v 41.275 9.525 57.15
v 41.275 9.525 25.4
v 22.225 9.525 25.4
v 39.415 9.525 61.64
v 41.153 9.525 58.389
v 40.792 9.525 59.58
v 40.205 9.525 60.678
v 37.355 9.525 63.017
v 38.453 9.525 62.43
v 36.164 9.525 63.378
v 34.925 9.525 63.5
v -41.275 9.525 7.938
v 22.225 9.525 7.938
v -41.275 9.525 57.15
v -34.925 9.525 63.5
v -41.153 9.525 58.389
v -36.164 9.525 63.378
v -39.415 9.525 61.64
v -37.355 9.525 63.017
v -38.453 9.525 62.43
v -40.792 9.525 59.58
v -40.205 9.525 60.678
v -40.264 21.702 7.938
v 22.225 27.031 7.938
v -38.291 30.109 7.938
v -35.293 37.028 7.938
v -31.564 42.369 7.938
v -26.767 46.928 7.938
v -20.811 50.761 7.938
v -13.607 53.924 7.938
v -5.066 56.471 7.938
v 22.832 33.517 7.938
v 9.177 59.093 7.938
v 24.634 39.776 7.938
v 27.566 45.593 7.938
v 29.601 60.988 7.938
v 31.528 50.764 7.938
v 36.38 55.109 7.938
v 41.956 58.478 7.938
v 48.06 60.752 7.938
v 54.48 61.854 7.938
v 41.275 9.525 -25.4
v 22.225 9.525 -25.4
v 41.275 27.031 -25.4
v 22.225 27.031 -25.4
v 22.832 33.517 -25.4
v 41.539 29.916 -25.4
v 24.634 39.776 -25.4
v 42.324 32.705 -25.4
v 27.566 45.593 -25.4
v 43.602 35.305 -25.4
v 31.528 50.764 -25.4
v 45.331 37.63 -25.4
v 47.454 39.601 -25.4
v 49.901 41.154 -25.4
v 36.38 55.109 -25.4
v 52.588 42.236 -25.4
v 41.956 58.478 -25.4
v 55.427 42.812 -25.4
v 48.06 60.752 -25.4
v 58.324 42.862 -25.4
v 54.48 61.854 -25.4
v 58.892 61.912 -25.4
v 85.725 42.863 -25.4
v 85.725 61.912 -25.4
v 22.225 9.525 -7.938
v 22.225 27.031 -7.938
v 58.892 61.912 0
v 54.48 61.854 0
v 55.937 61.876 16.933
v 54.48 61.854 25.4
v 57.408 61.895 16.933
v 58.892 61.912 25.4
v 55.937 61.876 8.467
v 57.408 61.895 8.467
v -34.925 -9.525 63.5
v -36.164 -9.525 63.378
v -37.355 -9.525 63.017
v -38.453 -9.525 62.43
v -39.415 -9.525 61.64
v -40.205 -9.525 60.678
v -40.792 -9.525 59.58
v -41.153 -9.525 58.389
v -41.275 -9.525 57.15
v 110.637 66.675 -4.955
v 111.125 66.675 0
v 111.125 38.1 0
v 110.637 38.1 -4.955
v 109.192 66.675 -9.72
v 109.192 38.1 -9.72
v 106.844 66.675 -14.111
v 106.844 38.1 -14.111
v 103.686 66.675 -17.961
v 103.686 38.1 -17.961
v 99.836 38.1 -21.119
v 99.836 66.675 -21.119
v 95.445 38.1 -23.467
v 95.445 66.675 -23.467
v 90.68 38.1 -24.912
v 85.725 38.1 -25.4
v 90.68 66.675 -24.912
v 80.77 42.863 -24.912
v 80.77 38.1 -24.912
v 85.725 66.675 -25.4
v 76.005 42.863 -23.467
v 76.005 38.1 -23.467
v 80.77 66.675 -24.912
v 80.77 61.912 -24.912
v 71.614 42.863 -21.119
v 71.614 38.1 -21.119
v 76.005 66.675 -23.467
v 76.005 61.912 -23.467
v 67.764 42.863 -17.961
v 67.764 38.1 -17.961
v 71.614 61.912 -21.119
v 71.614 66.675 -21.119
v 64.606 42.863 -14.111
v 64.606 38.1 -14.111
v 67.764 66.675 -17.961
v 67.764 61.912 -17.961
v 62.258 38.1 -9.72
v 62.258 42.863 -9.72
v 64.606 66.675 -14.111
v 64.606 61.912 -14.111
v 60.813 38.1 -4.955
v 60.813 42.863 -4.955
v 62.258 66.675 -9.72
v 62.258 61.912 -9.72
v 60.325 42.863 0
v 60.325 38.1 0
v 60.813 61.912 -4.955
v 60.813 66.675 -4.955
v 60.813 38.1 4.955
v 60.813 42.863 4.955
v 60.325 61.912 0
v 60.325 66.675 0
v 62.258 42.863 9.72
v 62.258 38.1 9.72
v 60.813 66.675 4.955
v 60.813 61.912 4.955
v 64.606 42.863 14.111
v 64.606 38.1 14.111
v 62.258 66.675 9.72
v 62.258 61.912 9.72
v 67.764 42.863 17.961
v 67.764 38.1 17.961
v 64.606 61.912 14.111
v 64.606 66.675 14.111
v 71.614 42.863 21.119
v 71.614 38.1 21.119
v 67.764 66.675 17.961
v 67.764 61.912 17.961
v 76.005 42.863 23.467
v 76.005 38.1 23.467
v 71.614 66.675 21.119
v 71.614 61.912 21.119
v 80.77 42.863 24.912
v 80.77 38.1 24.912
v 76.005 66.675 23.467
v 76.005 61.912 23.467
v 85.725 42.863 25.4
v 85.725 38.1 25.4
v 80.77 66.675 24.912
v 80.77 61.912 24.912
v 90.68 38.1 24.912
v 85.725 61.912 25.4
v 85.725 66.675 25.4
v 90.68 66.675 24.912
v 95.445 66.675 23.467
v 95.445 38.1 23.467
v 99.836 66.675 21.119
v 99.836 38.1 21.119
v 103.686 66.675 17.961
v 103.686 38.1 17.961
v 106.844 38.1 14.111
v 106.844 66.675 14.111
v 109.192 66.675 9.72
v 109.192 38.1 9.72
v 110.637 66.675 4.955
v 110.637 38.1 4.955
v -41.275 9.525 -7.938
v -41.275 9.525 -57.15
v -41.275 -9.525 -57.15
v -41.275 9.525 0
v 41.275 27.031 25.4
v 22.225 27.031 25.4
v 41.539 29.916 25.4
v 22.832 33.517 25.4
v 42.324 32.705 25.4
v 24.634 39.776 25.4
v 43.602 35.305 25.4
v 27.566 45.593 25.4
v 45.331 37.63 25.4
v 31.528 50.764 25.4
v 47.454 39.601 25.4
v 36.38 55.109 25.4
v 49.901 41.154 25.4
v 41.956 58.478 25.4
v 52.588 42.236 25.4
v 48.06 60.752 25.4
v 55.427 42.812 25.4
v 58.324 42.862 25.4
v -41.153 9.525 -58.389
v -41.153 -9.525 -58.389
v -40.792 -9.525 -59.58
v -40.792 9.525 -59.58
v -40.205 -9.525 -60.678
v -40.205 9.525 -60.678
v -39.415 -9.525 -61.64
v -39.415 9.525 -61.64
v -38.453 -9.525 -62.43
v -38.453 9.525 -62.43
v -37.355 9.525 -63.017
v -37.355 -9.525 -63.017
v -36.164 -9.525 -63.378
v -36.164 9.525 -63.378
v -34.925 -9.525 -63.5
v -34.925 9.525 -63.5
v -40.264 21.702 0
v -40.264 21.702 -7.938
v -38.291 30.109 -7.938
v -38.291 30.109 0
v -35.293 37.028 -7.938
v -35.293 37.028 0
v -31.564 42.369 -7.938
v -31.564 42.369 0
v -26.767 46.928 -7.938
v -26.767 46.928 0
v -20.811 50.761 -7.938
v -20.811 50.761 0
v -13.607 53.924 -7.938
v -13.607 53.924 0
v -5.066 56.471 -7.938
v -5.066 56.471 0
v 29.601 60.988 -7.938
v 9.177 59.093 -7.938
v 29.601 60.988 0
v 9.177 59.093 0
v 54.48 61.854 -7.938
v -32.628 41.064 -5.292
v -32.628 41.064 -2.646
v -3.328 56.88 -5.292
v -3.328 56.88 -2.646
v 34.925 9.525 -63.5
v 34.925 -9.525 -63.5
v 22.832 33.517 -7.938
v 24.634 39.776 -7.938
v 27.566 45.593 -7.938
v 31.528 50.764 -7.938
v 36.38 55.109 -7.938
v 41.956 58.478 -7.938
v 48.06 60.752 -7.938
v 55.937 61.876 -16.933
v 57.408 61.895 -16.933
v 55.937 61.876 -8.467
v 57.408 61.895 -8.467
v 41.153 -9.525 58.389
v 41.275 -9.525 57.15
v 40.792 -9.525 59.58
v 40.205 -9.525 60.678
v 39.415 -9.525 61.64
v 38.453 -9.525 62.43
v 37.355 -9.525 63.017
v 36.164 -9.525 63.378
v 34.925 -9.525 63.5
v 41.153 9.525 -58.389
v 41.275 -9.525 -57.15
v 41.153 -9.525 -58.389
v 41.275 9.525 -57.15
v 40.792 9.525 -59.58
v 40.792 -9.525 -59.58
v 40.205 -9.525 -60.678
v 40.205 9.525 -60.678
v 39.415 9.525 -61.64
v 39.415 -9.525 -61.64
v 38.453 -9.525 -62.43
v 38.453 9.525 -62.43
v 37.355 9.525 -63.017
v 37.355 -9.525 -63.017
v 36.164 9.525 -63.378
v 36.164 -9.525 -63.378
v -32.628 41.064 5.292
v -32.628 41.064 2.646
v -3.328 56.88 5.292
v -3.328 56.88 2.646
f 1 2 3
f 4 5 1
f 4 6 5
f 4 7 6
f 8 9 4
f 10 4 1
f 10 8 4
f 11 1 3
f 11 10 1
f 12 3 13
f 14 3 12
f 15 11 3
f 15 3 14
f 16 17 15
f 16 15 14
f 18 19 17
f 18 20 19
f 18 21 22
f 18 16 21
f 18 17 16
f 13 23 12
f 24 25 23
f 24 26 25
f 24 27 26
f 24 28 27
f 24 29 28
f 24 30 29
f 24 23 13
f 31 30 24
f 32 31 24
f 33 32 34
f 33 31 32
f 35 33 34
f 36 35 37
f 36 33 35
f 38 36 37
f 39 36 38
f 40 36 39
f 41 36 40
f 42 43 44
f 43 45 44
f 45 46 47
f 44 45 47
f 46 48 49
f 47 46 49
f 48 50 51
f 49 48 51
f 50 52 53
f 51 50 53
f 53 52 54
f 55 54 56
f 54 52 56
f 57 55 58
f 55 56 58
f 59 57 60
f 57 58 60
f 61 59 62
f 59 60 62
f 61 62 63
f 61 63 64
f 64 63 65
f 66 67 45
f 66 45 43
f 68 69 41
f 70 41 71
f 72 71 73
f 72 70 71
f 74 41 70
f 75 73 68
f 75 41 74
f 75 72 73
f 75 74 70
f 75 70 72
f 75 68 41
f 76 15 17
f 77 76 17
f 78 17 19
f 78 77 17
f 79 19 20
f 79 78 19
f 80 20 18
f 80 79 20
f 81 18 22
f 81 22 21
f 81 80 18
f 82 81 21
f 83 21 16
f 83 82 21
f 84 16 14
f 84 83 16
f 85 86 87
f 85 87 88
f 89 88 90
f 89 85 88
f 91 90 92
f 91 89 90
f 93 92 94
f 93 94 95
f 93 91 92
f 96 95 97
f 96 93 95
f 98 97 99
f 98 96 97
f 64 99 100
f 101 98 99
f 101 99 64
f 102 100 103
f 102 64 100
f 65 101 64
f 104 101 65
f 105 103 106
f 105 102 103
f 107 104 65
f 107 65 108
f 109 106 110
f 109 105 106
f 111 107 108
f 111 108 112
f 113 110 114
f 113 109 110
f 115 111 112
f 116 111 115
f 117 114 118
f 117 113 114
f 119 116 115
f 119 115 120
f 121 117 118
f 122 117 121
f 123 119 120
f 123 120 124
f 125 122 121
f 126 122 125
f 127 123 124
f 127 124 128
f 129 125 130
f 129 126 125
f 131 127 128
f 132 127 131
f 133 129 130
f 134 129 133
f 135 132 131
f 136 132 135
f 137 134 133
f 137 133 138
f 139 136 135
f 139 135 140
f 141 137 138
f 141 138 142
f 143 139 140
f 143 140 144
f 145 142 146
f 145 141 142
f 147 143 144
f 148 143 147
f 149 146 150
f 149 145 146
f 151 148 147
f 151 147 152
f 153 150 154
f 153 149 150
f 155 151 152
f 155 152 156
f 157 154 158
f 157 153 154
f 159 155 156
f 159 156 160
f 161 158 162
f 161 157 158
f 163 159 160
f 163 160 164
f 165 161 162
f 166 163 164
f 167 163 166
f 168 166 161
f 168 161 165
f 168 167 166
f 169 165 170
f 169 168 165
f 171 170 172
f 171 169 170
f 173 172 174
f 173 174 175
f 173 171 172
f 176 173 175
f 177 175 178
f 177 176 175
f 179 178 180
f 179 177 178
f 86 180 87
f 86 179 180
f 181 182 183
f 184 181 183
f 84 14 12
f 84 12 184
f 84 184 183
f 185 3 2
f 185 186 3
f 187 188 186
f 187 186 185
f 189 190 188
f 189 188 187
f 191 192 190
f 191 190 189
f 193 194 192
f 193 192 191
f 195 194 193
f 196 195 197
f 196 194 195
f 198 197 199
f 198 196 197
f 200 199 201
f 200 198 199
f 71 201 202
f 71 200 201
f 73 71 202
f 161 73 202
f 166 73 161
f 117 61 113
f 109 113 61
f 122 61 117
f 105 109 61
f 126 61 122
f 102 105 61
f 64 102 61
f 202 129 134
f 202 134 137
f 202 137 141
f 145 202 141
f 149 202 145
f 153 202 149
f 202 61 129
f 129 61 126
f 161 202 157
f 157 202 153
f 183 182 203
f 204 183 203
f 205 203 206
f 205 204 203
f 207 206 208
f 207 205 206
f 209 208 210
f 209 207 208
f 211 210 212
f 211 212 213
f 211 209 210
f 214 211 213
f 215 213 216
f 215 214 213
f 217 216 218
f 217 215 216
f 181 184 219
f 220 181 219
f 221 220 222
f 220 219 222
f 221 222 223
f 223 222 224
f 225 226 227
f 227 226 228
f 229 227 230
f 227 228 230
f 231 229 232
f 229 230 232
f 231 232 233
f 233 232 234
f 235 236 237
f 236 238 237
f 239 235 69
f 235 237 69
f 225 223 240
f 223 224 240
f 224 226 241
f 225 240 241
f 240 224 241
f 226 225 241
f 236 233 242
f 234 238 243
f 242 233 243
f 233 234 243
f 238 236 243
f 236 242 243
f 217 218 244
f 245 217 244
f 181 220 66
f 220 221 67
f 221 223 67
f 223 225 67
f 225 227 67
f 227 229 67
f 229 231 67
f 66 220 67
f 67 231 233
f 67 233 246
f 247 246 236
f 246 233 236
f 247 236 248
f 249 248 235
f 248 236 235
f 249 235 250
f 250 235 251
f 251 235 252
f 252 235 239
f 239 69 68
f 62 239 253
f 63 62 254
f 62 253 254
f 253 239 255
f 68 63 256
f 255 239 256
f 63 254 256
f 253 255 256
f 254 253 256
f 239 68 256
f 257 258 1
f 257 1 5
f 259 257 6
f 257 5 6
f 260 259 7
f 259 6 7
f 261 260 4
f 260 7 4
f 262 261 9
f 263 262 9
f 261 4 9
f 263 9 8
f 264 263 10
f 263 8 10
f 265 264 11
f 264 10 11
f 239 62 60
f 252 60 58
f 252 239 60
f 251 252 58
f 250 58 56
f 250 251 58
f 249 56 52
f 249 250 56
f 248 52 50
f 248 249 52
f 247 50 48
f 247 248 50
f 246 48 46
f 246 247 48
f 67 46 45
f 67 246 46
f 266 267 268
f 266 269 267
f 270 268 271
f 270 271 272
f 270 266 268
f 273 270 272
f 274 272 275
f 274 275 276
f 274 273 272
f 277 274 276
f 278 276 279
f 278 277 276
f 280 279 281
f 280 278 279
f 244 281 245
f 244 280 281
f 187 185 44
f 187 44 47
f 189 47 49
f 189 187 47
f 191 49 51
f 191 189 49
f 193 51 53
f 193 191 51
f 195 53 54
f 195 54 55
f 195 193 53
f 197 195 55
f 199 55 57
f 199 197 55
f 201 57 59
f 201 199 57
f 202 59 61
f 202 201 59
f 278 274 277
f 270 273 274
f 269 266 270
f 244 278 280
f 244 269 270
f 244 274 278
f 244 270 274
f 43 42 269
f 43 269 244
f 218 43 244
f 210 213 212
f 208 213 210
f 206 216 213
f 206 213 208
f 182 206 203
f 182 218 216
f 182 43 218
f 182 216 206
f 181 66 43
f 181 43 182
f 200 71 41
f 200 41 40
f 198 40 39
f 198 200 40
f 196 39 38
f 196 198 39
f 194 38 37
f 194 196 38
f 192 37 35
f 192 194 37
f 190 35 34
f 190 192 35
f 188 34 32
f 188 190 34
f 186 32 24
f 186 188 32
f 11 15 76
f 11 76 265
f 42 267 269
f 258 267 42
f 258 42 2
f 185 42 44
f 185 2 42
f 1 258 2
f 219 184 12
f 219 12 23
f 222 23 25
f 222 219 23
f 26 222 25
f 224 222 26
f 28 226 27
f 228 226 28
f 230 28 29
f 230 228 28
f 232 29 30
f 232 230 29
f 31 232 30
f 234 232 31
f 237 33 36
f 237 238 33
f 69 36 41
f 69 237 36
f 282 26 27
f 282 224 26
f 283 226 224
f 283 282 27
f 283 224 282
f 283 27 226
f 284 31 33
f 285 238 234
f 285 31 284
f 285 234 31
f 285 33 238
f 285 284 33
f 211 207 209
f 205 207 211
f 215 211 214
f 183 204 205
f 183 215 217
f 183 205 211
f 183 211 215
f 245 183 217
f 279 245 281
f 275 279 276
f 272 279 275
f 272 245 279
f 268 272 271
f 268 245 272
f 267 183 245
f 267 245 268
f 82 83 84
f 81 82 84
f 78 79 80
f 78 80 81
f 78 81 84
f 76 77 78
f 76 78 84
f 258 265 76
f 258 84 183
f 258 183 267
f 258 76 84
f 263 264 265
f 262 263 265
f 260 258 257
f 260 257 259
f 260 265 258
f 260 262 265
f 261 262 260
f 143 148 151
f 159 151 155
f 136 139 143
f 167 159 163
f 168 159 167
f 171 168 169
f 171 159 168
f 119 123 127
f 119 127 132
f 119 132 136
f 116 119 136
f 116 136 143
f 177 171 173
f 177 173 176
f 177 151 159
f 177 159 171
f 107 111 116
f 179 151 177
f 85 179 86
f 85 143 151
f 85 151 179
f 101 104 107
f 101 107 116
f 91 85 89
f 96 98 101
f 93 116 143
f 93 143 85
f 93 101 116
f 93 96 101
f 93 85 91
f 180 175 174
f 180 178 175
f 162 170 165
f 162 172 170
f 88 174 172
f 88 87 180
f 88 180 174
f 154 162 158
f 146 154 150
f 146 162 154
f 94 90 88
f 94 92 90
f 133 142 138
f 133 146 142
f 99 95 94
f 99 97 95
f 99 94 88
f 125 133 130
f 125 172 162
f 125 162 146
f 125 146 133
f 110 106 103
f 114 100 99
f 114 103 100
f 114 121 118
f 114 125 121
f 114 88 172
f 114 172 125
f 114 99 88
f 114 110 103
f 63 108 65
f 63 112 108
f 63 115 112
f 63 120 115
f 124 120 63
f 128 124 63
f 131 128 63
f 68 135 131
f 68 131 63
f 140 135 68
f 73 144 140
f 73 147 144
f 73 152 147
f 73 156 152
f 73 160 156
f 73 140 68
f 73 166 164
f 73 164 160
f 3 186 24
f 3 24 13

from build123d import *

# Parameters (mm, degrees)
F1_DEPTH = 63.5
F0_W     = 25.4
F0_H     = 19.05
F2_DEPTH = 25.4
F3_DEPTH = 7.9375
F5_R     = 6.35


with BuildPart() as f1:
    # F0 (on Top) → F1 (new body, symmetric)
    with BuildSketch(Plane.XY):
        Polygon((41.275, -9.525), (41.275, 9.525), (22.225, 9.525), (-41.275, 9.525), (-41.275, -9.525), align=None)
    extrude(amount=F1_DEPTH, both=True)

    # F0 (on Top) → F2 (join, symmetric)
    with BuildSketch(Plane.XY):
        with BuildLine():
            Line((22.225, 9.525), (41.275, 9.525))
            Line((41.275, 9.525), (41.275, 27.0309934289))
            ThreePointArc((41.275, 27.0309934289), (46.3478401758, 38.6640913883), (58.3243188197, 42.8625))
            Line((58.3243188197, 42.8625), (60.325, 42.8625))
            Line((60.325, 42.8625), (60.325, 61.9125))
            Line((60.325, 61.9125), (58.8924477992, 61.9125))
            add(Edge.make_bspline(
                [(54.4796435379, 61.8537564061), (55.9299212124, 61.8766562618), (57.4007696655, 61.8961838395), (58.8924477992, 61.9125)],
                knots=[110.8863005517, 110.8863005517, 110.8863005517, 110.8863005517, 113.0396733667, 113.0396733667, 113.0396733667, 113.0396733667], degree=3))
            ThreePointArc((54.4796435379, 61.8537564061), (31.5275701344, 50.7638127469), (22.225, 27.0309934289))
            Line((22.225, 27.0309934289), (22.225, 9.525))
        make_face()
        with Locations((73.025, 52.3875)):
            Rectangle(F0_W, F0_H)
    extrude(amount=F2_DEPTH, both=True)

    # F0 (on Top) → F3 (join, symmetric)
    with BuildSketch(Plane.XY):
        with BuildLine():
            Line((-41.275, 9.525), (22.225, 9.525))
            Line((22.225, 9.525), (22.225, 27.0309934289))
            ThreePointArc((22.225, 27.0309934289), (31.5275701344, 50.7638127469), (54.4796435379, 61.8537564061))
            add(Edge.make_bspline(
                [(-41.275, 9.525), (-40.3356067229, 50.553210625), (-20.2013057937, 60.6745456992), (54.4796435379, 61.8537564061)],
                knots=[0, 0, 0, 0, 110.8863005517, 110.8863005517, 110.8863005517, 110.8863005517], degree=3))
        make_face()
    extrude(amount=F3_DEPTH, both=True)

    # F0 (on Top) → F4 (revolve)
    with BuildSketch(Plane.XY):
        Polygon((85.725, 61.9125), (85.725, 42.8625), (85.725, 38.1), (111.125, 38.1), (111.125, 66.675), (85.725, 66.675), align=None)
    revolve(axis=Axis((85.725, 52.3875, 0), (0, 1, 0)))

    # F5
    f5_edges = [f1.edges().sort_by_distance(p)[0] for p in [
        (-41.275, 0, 63.5),
        (41.275, 0, 63.5),
        (41.275, 0, -63.5),
        (-41.275, 0, -63.5),
    ]]
    fillet(f5_edges, radius=F5_R)


solid = f1.part
